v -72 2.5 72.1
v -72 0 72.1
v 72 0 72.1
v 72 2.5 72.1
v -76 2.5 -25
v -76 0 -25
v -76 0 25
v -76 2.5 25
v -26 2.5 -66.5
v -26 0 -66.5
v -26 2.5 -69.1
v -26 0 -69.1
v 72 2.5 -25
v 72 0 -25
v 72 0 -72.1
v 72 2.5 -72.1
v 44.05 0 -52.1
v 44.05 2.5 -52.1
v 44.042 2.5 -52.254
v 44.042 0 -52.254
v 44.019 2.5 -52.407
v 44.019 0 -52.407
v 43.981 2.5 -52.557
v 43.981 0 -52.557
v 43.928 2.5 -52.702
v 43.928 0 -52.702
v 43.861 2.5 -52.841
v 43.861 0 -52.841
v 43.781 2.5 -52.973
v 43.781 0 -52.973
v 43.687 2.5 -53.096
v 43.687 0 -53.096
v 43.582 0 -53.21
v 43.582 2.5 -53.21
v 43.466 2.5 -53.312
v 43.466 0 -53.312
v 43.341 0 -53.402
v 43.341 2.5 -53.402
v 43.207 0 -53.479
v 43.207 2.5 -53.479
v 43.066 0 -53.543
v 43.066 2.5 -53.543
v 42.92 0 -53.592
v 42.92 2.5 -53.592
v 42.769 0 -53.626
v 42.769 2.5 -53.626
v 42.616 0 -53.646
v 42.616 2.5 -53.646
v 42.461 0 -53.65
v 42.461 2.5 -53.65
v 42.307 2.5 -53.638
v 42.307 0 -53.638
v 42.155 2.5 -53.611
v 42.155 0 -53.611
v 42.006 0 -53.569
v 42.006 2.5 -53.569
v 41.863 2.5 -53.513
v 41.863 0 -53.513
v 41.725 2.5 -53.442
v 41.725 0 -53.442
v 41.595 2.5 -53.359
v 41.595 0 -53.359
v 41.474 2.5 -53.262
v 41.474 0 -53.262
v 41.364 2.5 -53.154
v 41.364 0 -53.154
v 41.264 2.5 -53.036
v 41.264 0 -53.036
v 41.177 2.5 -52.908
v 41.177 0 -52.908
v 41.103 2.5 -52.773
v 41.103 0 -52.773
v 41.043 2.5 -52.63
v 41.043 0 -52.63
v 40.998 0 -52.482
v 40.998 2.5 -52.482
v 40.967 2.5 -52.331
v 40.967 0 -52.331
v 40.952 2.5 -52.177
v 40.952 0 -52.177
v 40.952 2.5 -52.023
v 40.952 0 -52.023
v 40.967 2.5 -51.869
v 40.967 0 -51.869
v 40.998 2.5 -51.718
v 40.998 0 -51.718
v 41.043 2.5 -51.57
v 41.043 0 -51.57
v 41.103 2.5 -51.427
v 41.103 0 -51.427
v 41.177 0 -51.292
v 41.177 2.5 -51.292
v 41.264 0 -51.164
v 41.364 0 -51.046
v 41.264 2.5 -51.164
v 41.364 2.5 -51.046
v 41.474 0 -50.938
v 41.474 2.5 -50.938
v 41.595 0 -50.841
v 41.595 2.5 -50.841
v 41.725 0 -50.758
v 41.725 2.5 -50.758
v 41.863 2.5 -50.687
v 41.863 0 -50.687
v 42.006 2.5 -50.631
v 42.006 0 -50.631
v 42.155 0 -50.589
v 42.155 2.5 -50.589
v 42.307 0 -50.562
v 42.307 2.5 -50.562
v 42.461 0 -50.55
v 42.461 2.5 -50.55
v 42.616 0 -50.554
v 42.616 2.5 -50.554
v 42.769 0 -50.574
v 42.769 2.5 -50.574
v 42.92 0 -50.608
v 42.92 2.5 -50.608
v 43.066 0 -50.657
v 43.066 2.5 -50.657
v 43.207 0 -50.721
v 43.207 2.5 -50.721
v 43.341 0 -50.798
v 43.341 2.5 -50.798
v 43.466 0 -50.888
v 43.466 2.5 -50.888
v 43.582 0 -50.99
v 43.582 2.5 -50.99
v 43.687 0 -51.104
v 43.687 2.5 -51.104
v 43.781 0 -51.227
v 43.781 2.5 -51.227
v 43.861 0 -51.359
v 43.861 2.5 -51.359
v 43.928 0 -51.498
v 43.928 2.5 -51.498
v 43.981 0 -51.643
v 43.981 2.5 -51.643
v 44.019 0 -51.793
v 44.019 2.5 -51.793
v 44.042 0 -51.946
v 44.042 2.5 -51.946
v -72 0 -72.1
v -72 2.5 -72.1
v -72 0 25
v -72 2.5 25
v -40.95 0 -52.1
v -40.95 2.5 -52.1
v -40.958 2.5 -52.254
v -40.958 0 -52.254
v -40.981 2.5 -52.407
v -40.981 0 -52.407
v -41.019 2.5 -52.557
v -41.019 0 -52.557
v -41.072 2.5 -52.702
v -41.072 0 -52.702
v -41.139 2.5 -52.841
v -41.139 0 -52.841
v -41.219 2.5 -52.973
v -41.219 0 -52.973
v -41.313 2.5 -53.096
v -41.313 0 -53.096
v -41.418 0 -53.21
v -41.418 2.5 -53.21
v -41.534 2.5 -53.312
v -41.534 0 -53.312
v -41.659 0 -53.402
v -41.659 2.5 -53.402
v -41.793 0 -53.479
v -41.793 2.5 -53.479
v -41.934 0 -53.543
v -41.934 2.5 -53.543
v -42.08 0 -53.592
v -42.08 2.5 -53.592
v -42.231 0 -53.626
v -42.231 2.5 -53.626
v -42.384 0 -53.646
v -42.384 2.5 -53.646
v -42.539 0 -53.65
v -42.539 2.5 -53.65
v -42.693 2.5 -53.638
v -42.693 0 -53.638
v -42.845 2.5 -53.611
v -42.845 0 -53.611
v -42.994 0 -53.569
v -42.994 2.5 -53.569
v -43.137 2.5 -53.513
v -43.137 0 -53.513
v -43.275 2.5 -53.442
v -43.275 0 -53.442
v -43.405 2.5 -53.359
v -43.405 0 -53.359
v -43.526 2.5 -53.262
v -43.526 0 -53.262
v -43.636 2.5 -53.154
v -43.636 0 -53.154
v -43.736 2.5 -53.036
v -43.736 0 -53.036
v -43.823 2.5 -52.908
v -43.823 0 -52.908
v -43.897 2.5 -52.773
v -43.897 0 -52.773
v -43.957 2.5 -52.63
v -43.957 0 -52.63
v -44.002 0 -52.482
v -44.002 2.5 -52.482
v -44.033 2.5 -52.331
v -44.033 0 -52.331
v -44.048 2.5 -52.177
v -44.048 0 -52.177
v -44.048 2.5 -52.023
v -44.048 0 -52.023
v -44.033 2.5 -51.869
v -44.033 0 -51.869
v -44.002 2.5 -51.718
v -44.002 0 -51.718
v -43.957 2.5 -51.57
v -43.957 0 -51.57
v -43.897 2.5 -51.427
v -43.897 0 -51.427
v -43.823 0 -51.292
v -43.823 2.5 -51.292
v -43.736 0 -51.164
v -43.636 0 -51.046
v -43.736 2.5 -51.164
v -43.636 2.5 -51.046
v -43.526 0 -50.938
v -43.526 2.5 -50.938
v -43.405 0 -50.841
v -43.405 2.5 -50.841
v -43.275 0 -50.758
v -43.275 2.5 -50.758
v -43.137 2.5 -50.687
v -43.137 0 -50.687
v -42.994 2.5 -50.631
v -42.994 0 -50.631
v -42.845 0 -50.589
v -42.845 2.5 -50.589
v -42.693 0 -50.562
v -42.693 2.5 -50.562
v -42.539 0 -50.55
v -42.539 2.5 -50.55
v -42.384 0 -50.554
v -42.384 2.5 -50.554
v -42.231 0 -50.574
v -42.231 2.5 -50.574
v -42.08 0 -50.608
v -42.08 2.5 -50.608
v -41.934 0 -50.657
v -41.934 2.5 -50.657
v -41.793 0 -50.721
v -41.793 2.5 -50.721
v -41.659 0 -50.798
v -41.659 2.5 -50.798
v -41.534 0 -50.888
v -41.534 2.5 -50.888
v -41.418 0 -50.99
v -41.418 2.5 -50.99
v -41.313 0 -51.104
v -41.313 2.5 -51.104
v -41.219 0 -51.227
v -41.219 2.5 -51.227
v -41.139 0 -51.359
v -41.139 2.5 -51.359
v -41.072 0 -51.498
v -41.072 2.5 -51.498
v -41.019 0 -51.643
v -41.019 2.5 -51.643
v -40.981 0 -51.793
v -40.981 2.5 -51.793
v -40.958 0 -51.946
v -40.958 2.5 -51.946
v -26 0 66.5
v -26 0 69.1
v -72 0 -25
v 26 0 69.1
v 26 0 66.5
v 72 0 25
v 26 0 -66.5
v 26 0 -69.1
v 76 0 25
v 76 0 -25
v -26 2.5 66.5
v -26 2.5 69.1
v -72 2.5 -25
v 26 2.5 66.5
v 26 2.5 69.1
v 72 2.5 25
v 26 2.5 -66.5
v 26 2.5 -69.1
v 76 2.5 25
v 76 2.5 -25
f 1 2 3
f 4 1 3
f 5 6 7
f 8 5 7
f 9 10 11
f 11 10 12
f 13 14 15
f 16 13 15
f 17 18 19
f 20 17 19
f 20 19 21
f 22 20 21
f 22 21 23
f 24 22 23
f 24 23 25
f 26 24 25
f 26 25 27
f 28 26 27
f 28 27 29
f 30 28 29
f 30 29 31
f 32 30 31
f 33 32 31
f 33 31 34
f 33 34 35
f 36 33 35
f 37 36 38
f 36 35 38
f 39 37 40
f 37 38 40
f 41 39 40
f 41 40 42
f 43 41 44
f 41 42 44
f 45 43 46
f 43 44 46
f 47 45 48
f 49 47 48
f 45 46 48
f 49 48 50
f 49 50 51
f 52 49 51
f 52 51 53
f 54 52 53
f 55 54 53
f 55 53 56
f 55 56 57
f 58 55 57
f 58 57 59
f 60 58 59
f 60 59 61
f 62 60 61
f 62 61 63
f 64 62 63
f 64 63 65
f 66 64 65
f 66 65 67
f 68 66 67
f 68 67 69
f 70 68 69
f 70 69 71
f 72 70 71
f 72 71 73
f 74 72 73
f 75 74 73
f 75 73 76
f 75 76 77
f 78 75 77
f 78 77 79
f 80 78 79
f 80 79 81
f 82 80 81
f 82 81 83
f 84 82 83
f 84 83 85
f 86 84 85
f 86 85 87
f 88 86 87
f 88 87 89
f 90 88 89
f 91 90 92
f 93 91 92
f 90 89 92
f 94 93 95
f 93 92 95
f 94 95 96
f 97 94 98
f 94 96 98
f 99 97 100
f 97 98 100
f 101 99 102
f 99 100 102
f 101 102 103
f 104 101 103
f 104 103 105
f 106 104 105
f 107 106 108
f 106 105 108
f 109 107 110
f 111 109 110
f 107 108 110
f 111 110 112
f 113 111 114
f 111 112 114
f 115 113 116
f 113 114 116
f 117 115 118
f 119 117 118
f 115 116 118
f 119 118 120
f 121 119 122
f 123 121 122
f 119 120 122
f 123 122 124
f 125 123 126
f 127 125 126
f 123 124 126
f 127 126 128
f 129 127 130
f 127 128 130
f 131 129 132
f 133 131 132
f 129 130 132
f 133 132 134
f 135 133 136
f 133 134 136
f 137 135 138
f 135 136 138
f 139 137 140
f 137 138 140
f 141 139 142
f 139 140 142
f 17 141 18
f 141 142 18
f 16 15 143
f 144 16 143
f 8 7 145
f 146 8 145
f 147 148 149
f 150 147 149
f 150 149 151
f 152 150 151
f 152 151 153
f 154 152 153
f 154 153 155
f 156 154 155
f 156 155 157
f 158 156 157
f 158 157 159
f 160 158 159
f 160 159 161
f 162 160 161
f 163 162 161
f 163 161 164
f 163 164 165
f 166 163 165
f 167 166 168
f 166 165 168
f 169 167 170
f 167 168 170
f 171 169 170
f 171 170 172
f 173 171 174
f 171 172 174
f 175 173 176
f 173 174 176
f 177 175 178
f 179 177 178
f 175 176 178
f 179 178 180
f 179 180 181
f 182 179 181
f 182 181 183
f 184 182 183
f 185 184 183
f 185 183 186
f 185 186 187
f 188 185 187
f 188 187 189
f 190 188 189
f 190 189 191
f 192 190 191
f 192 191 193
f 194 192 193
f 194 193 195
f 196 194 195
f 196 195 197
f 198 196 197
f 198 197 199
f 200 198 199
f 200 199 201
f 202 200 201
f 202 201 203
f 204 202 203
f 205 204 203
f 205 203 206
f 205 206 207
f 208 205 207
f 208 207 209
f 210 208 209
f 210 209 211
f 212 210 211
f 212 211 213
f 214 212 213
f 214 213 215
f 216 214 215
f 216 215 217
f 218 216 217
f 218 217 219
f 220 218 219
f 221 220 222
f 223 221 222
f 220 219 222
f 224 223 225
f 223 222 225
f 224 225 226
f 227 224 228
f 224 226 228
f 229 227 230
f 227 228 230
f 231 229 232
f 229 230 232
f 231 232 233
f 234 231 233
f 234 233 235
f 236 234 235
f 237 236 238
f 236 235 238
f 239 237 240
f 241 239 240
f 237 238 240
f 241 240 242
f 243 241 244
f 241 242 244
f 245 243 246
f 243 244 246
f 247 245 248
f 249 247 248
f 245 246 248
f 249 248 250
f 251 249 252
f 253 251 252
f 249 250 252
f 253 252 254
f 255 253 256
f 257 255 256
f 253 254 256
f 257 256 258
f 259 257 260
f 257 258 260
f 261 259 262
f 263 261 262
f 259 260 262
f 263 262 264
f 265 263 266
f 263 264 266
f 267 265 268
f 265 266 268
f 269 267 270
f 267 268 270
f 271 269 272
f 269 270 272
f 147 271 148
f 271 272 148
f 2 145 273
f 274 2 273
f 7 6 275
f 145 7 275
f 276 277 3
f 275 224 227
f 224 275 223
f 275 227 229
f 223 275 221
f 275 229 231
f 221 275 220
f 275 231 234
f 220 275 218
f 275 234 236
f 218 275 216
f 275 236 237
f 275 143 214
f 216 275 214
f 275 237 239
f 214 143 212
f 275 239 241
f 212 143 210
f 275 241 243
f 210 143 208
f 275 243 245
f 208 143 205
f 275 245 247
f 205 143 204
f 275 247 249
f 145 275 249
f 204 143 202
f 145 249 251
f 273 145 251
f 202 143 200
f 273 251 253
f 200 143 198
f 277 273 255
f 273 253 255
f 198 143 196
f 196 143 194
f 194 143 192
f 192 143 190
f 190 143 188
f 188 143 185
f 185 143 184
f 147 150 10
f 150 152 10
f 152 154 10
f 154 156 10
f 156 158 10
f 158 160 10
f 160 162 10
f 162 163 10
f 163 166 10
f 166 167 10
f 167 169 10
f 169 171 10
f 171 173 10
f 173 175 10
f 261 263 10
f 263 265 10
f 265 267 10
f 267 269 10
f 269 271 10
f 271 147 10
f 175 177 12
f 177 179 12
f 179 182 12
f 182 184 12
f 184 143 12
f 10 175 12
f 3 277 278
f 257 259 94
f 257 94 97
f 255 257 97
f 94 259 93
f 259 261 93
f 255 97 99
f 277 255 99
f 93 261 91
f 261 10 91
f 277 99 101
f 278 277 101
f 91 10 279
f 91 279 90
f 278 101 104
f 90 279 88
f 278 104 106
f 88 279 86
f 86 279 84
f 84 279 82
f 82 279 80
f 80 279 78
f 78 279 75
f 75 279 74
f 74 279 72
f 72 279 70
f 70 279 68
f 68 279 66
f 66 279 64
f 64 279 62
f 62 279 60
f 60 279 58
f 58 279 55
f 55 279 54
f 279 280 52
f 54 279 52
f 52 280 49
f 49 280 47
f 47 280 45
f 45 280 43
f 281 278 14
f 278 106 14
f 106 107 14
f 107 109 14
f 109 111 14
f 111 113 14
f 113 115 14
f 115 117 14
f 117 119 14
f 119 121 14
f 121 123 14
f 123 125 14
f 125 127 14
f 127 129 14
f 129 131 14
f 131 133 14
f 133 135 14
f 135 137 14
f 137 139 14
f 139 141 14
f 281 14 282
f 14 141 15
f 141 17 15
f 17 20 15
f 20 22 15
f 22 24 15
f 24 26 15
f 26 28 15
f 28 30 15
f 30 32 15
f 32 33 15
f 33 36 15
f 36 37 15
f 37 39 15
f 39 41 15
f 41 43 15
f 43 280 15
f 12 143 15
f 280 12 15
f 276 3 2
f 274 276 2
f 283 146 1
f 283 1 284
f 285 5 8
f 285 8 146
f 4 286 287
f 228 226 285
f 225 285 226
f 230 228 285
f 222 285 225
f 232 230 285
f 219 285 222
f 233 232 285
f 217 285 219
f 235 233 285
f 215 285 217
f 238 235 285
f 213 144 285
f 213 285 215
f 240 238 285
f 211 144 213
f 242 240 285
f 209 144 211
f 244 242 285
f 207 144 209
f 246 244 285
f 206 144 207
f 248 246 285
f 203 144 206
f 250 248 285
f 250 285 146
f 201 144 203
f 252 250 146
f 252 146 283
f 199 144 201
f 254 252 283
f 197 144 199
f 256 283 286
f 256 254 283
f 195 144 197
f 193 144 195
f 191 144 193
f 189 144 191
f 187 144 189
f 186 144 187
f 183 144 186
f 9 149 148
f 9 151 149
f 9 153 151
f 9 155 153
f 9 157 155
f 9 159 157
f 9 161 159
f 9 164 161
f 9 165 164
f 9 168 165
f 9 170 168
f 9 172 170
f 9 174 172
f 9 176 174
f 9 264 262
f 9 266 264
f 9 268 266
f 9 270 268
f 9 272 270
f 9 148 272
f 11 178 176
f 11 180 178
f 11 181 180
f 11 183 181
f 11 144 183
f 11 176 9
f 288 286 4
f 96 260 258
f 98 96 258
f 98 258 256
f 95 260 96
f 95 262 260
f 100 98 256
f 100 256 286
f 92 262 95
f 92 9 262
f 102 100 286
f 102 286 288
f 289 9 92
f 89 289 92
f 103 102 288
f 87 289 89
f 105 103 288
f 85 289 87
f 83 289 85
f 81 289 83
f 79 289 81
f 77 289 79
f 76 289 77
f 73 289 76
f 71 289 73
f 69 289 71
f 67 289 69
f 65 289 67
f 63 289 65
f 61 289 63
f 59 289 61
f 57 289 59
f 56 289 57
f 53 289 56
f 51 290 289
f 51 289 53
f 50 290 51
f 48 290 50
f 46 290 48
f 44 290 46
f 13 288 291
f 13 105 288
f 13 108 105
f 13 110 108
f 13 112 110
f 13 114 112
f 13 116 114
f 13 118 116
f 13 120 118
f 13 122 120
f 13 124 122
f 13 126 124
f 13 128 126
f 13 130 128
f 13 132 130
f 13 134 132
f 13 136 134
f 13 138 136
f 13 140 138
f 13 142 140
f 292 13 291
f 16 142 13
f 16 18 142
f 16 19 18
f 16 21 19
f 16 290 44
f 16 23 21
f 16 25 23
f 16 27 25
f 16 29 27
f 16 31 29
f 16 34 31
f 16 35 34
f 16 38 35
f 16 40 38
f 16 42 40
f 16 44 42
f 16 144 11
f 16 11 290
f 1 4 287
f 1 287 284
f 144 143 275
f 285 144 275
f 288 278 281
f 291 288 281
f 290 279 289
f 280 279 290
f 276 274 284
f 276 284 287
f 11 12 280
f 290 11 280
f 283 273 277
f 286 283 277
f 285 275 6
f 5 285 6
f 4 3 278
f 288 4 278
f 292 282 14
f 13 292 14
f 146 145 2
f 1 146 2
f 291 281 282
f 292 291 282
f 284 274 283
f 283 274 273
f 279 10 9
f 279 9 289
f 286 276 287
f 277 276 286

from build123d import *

# Parameters (mm, degrees)
SKETCH1_W           = 52
SKETCH1_H           = 2.6
BOSS_EXTRUDE1_DEPTH = 2.5
SKETCH2_R           = 1.55
CUT_EXTRUDE1_DEPTH  = 10


with BuildPart() as part:
    # Sketch1 → Boss-Extrude1 (new body)
    with BuildSketch(Plane(origin=(0, 0, 0), x_dir=(1, 0, 0), z_dir=(0, 1, 0))):
        Polygon((72, -25), (76, -25), (76, 25), (72, 25), (72, 72.1), (-72, 72.1), (-72, 25), (-76, 25), (-76, -25), (-72, -25), (-72, -72.1), (72, -72.1), align=None)
        with Locations((0, -67.8)):
            Rectangle(SKETCH1_W, SKETCH1_H, mode=Mode.SUBTRACT)
        with Locations((0, 67.8)):
            Rectangle(SKETCH1_W, SKETCH1_H, mode=Mode.SUBTRACT)
    extrude(amount=BOSS_EXTRUDE1_DEPTH)

    # Sketch2 → Cut-Extrude1 (cut)
    with BuildSketch(Plane(origin=(0, 2.5, 0), x_dir=(1, 0, 0), z_dir=(0, 1, 0))):
        with Locations((-42.5, 52.1)):
            Circle(SKETCH2_R)
        with Locations((42.5, 52.1)):
            Circle(SKETCH2_R)
    extrude(amount=-CUT_EXTRUDE1_DEPTH, mode=Mode.SUBTRACT)


solid = part.part
